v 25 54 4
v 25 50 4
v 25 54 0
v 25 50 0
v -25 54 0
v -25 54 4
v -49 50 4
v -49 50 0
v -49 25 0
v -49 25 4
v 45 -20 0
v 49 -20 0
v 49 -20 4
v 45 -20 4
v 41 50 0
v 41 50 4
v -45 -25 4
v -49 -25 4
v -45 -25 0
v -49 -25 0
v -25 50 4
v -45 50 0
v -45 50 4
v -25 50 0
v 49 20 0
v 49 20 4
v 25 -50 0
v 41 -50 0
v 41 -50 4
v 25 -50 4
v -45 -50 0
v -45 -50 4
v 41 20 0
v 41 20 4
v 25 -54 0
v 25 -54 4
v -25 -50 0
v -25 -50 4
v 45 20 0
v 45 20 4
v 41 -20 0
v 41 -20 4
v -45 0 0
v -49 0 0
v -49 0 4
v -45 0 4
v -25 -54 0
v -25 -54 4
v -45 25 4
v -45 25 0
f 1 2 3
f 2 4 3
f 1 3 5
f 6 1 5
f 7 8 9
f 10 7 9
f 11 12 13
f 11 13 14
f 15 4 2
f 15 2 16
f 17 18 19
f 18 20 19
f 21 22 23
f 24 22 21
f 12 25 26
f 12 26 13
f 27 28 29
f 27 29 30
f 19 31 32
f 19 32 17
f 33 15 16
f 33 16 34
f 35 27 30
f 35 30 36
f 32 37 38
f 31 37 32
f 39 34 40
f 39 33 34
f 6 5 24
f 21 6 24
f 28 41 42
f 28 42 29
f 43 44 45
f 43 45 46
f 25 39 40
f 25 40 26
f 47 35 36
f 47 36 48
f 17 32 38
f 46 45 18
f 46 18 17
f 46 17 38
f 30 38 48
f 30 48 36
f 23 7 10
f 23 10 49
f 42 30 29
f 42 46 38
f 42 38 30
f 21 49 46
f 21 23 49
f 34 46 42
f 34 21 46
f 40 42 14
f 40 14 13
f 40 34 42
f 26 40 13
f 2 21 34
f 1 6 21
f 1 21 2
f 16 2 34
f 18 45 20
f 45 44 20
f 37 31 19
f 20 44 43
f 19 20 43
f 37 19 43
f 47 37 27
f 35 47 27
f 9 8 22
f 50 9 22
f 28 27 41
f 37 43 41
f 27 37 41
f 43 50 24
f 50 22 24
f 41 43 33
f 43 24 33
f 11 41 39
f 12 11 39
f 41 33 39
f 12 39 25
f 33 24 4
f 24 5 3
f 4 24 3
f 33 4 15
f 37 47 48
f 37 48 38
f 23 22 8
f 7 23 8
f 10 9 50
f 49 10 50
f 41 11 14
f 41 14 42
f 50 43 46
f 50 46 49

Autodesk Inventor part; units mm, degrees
ref_plane "YZ Plane" through (0, 0, 0) normal (1, 0, 0) x (0, 1, 0)
ref_plane "XZ Plane" through (0, 0, 0) normal (0, 1, 0) x (-1, 0, 0)
ref_plane "XY Plane" through (0, 0, 0) normal (0, 0, 1) x (1, 0, 0)
sketch "Sketch1" plane through (0, 0, 0) normal (0, 0, 1) x (1, 0, 0)
  line L0 (45, -50) -> (41, -50) construction
  line L1 (-45, -50) -> (-45, 50) construction
  line L2 (-45, 50) -> (-25, 50)
  line L3 (45, 50) -> (45, 20) construction
  line L4 (45, -50) -> (-45, 50) construction
  line L5 (-45, -50) -> (45, 50) construction
  line L6 (-25, 50) -> (25, 50) construction
  line L7 (25, 50) -> (25, 54)
  line L8 (25, 54) -> (-25, 54)
  line L9 (-25, 54) -> (-25, 50)
  line L10 (-25, -50) -> (25, -50) construction
  line L11 (25, -50) -> (25, -54)
  line L12 (25, -54) -> (-25, -54)
  line L13 (-25, -54) -> (-25, -50)
  line L14 (-45, 50) -> (-49, 50)
  line L15 (-49, 50) -> (-49, 25)
  line L16 (-49, 25) -> (-45, 25)
  line L17 (-45, 25) -> (-45, 50) construction
  line L18 (-45, 0) -> (-45, 25)
  line L19 (-45, 25) -> (-49, 25)
  line L20 (-49, 25) -> (-49, 0) construction
  line L21 (-49, 0) -> (-45, 0)
  line L22 (-45, -25) -> (-45, 0) construction
  line L23 (-45, 0) -> (-49, 0)
  line L24 (-49, 0) -> (-49, -25)
  line L25 (-49, -25) -> (-45, -25)
  line L26 (-45, -50) -> (-45, -25)
  line L27 (-45, -25) -> (-49, -25)
  line L28 (-49, -25) -> (-49, -50) construction
  line L29 (-49, -50) -> (-45, -50) construction
  line L30 (0, -75.6) -> (0, 75.6) construction
  line L31 (45, 20) -> (49, 20)
  line L32 (49, 20) -> (49, -20)
  line L33 (49, -20) -> (45, -20)
  line L34 (45, -20) -> (45, 20) construction
  line L35 (25, 50) -> (41, 50)
  line L36 (-25, 50) -> (25, 50) construction
  line L37 (-25, -50) -> (-45, -50)
  line L38 (25, -50) -> (-25, -50) construction
  line L39 (-68.6, 0) -> (68.6, 0) construction
  line L40 (41, 50) -> (41, 20)
  line L41 (41, 20) -> (45, 20)
  line L42 (45, -20) -> (41, -20)
  line L43 (41, -20) -> (41, -50)
  line L44 (41, 50) -> (45, 50) construction
  line L45 (45, 20) -> (45, -20) construction
  line L46 (45, -20) -> (45, -50) construction
  line L47 (41, -50) -> (25, -50)
  point P0 (0, 0)
  point P1 (41, 35)
  dimension "d0" = 90
  dimension "d1" = 100
  dimension "d2" = 50
  dimension "d3" = 4
  dimension "d4" = 50
  dimension "d5" = 4
  dimension "d6" = 4
  dimension "d7" = 25
  dimension "d10" = 25
  dimension "d17" = 4
  dimension "d18" = 40
  dimension "d20" = 4
extrude "Extrusion1" add sketch "Sketch1" along normal blind 4
properties part number "CarSide_V2" material "Wood (Oak)"
